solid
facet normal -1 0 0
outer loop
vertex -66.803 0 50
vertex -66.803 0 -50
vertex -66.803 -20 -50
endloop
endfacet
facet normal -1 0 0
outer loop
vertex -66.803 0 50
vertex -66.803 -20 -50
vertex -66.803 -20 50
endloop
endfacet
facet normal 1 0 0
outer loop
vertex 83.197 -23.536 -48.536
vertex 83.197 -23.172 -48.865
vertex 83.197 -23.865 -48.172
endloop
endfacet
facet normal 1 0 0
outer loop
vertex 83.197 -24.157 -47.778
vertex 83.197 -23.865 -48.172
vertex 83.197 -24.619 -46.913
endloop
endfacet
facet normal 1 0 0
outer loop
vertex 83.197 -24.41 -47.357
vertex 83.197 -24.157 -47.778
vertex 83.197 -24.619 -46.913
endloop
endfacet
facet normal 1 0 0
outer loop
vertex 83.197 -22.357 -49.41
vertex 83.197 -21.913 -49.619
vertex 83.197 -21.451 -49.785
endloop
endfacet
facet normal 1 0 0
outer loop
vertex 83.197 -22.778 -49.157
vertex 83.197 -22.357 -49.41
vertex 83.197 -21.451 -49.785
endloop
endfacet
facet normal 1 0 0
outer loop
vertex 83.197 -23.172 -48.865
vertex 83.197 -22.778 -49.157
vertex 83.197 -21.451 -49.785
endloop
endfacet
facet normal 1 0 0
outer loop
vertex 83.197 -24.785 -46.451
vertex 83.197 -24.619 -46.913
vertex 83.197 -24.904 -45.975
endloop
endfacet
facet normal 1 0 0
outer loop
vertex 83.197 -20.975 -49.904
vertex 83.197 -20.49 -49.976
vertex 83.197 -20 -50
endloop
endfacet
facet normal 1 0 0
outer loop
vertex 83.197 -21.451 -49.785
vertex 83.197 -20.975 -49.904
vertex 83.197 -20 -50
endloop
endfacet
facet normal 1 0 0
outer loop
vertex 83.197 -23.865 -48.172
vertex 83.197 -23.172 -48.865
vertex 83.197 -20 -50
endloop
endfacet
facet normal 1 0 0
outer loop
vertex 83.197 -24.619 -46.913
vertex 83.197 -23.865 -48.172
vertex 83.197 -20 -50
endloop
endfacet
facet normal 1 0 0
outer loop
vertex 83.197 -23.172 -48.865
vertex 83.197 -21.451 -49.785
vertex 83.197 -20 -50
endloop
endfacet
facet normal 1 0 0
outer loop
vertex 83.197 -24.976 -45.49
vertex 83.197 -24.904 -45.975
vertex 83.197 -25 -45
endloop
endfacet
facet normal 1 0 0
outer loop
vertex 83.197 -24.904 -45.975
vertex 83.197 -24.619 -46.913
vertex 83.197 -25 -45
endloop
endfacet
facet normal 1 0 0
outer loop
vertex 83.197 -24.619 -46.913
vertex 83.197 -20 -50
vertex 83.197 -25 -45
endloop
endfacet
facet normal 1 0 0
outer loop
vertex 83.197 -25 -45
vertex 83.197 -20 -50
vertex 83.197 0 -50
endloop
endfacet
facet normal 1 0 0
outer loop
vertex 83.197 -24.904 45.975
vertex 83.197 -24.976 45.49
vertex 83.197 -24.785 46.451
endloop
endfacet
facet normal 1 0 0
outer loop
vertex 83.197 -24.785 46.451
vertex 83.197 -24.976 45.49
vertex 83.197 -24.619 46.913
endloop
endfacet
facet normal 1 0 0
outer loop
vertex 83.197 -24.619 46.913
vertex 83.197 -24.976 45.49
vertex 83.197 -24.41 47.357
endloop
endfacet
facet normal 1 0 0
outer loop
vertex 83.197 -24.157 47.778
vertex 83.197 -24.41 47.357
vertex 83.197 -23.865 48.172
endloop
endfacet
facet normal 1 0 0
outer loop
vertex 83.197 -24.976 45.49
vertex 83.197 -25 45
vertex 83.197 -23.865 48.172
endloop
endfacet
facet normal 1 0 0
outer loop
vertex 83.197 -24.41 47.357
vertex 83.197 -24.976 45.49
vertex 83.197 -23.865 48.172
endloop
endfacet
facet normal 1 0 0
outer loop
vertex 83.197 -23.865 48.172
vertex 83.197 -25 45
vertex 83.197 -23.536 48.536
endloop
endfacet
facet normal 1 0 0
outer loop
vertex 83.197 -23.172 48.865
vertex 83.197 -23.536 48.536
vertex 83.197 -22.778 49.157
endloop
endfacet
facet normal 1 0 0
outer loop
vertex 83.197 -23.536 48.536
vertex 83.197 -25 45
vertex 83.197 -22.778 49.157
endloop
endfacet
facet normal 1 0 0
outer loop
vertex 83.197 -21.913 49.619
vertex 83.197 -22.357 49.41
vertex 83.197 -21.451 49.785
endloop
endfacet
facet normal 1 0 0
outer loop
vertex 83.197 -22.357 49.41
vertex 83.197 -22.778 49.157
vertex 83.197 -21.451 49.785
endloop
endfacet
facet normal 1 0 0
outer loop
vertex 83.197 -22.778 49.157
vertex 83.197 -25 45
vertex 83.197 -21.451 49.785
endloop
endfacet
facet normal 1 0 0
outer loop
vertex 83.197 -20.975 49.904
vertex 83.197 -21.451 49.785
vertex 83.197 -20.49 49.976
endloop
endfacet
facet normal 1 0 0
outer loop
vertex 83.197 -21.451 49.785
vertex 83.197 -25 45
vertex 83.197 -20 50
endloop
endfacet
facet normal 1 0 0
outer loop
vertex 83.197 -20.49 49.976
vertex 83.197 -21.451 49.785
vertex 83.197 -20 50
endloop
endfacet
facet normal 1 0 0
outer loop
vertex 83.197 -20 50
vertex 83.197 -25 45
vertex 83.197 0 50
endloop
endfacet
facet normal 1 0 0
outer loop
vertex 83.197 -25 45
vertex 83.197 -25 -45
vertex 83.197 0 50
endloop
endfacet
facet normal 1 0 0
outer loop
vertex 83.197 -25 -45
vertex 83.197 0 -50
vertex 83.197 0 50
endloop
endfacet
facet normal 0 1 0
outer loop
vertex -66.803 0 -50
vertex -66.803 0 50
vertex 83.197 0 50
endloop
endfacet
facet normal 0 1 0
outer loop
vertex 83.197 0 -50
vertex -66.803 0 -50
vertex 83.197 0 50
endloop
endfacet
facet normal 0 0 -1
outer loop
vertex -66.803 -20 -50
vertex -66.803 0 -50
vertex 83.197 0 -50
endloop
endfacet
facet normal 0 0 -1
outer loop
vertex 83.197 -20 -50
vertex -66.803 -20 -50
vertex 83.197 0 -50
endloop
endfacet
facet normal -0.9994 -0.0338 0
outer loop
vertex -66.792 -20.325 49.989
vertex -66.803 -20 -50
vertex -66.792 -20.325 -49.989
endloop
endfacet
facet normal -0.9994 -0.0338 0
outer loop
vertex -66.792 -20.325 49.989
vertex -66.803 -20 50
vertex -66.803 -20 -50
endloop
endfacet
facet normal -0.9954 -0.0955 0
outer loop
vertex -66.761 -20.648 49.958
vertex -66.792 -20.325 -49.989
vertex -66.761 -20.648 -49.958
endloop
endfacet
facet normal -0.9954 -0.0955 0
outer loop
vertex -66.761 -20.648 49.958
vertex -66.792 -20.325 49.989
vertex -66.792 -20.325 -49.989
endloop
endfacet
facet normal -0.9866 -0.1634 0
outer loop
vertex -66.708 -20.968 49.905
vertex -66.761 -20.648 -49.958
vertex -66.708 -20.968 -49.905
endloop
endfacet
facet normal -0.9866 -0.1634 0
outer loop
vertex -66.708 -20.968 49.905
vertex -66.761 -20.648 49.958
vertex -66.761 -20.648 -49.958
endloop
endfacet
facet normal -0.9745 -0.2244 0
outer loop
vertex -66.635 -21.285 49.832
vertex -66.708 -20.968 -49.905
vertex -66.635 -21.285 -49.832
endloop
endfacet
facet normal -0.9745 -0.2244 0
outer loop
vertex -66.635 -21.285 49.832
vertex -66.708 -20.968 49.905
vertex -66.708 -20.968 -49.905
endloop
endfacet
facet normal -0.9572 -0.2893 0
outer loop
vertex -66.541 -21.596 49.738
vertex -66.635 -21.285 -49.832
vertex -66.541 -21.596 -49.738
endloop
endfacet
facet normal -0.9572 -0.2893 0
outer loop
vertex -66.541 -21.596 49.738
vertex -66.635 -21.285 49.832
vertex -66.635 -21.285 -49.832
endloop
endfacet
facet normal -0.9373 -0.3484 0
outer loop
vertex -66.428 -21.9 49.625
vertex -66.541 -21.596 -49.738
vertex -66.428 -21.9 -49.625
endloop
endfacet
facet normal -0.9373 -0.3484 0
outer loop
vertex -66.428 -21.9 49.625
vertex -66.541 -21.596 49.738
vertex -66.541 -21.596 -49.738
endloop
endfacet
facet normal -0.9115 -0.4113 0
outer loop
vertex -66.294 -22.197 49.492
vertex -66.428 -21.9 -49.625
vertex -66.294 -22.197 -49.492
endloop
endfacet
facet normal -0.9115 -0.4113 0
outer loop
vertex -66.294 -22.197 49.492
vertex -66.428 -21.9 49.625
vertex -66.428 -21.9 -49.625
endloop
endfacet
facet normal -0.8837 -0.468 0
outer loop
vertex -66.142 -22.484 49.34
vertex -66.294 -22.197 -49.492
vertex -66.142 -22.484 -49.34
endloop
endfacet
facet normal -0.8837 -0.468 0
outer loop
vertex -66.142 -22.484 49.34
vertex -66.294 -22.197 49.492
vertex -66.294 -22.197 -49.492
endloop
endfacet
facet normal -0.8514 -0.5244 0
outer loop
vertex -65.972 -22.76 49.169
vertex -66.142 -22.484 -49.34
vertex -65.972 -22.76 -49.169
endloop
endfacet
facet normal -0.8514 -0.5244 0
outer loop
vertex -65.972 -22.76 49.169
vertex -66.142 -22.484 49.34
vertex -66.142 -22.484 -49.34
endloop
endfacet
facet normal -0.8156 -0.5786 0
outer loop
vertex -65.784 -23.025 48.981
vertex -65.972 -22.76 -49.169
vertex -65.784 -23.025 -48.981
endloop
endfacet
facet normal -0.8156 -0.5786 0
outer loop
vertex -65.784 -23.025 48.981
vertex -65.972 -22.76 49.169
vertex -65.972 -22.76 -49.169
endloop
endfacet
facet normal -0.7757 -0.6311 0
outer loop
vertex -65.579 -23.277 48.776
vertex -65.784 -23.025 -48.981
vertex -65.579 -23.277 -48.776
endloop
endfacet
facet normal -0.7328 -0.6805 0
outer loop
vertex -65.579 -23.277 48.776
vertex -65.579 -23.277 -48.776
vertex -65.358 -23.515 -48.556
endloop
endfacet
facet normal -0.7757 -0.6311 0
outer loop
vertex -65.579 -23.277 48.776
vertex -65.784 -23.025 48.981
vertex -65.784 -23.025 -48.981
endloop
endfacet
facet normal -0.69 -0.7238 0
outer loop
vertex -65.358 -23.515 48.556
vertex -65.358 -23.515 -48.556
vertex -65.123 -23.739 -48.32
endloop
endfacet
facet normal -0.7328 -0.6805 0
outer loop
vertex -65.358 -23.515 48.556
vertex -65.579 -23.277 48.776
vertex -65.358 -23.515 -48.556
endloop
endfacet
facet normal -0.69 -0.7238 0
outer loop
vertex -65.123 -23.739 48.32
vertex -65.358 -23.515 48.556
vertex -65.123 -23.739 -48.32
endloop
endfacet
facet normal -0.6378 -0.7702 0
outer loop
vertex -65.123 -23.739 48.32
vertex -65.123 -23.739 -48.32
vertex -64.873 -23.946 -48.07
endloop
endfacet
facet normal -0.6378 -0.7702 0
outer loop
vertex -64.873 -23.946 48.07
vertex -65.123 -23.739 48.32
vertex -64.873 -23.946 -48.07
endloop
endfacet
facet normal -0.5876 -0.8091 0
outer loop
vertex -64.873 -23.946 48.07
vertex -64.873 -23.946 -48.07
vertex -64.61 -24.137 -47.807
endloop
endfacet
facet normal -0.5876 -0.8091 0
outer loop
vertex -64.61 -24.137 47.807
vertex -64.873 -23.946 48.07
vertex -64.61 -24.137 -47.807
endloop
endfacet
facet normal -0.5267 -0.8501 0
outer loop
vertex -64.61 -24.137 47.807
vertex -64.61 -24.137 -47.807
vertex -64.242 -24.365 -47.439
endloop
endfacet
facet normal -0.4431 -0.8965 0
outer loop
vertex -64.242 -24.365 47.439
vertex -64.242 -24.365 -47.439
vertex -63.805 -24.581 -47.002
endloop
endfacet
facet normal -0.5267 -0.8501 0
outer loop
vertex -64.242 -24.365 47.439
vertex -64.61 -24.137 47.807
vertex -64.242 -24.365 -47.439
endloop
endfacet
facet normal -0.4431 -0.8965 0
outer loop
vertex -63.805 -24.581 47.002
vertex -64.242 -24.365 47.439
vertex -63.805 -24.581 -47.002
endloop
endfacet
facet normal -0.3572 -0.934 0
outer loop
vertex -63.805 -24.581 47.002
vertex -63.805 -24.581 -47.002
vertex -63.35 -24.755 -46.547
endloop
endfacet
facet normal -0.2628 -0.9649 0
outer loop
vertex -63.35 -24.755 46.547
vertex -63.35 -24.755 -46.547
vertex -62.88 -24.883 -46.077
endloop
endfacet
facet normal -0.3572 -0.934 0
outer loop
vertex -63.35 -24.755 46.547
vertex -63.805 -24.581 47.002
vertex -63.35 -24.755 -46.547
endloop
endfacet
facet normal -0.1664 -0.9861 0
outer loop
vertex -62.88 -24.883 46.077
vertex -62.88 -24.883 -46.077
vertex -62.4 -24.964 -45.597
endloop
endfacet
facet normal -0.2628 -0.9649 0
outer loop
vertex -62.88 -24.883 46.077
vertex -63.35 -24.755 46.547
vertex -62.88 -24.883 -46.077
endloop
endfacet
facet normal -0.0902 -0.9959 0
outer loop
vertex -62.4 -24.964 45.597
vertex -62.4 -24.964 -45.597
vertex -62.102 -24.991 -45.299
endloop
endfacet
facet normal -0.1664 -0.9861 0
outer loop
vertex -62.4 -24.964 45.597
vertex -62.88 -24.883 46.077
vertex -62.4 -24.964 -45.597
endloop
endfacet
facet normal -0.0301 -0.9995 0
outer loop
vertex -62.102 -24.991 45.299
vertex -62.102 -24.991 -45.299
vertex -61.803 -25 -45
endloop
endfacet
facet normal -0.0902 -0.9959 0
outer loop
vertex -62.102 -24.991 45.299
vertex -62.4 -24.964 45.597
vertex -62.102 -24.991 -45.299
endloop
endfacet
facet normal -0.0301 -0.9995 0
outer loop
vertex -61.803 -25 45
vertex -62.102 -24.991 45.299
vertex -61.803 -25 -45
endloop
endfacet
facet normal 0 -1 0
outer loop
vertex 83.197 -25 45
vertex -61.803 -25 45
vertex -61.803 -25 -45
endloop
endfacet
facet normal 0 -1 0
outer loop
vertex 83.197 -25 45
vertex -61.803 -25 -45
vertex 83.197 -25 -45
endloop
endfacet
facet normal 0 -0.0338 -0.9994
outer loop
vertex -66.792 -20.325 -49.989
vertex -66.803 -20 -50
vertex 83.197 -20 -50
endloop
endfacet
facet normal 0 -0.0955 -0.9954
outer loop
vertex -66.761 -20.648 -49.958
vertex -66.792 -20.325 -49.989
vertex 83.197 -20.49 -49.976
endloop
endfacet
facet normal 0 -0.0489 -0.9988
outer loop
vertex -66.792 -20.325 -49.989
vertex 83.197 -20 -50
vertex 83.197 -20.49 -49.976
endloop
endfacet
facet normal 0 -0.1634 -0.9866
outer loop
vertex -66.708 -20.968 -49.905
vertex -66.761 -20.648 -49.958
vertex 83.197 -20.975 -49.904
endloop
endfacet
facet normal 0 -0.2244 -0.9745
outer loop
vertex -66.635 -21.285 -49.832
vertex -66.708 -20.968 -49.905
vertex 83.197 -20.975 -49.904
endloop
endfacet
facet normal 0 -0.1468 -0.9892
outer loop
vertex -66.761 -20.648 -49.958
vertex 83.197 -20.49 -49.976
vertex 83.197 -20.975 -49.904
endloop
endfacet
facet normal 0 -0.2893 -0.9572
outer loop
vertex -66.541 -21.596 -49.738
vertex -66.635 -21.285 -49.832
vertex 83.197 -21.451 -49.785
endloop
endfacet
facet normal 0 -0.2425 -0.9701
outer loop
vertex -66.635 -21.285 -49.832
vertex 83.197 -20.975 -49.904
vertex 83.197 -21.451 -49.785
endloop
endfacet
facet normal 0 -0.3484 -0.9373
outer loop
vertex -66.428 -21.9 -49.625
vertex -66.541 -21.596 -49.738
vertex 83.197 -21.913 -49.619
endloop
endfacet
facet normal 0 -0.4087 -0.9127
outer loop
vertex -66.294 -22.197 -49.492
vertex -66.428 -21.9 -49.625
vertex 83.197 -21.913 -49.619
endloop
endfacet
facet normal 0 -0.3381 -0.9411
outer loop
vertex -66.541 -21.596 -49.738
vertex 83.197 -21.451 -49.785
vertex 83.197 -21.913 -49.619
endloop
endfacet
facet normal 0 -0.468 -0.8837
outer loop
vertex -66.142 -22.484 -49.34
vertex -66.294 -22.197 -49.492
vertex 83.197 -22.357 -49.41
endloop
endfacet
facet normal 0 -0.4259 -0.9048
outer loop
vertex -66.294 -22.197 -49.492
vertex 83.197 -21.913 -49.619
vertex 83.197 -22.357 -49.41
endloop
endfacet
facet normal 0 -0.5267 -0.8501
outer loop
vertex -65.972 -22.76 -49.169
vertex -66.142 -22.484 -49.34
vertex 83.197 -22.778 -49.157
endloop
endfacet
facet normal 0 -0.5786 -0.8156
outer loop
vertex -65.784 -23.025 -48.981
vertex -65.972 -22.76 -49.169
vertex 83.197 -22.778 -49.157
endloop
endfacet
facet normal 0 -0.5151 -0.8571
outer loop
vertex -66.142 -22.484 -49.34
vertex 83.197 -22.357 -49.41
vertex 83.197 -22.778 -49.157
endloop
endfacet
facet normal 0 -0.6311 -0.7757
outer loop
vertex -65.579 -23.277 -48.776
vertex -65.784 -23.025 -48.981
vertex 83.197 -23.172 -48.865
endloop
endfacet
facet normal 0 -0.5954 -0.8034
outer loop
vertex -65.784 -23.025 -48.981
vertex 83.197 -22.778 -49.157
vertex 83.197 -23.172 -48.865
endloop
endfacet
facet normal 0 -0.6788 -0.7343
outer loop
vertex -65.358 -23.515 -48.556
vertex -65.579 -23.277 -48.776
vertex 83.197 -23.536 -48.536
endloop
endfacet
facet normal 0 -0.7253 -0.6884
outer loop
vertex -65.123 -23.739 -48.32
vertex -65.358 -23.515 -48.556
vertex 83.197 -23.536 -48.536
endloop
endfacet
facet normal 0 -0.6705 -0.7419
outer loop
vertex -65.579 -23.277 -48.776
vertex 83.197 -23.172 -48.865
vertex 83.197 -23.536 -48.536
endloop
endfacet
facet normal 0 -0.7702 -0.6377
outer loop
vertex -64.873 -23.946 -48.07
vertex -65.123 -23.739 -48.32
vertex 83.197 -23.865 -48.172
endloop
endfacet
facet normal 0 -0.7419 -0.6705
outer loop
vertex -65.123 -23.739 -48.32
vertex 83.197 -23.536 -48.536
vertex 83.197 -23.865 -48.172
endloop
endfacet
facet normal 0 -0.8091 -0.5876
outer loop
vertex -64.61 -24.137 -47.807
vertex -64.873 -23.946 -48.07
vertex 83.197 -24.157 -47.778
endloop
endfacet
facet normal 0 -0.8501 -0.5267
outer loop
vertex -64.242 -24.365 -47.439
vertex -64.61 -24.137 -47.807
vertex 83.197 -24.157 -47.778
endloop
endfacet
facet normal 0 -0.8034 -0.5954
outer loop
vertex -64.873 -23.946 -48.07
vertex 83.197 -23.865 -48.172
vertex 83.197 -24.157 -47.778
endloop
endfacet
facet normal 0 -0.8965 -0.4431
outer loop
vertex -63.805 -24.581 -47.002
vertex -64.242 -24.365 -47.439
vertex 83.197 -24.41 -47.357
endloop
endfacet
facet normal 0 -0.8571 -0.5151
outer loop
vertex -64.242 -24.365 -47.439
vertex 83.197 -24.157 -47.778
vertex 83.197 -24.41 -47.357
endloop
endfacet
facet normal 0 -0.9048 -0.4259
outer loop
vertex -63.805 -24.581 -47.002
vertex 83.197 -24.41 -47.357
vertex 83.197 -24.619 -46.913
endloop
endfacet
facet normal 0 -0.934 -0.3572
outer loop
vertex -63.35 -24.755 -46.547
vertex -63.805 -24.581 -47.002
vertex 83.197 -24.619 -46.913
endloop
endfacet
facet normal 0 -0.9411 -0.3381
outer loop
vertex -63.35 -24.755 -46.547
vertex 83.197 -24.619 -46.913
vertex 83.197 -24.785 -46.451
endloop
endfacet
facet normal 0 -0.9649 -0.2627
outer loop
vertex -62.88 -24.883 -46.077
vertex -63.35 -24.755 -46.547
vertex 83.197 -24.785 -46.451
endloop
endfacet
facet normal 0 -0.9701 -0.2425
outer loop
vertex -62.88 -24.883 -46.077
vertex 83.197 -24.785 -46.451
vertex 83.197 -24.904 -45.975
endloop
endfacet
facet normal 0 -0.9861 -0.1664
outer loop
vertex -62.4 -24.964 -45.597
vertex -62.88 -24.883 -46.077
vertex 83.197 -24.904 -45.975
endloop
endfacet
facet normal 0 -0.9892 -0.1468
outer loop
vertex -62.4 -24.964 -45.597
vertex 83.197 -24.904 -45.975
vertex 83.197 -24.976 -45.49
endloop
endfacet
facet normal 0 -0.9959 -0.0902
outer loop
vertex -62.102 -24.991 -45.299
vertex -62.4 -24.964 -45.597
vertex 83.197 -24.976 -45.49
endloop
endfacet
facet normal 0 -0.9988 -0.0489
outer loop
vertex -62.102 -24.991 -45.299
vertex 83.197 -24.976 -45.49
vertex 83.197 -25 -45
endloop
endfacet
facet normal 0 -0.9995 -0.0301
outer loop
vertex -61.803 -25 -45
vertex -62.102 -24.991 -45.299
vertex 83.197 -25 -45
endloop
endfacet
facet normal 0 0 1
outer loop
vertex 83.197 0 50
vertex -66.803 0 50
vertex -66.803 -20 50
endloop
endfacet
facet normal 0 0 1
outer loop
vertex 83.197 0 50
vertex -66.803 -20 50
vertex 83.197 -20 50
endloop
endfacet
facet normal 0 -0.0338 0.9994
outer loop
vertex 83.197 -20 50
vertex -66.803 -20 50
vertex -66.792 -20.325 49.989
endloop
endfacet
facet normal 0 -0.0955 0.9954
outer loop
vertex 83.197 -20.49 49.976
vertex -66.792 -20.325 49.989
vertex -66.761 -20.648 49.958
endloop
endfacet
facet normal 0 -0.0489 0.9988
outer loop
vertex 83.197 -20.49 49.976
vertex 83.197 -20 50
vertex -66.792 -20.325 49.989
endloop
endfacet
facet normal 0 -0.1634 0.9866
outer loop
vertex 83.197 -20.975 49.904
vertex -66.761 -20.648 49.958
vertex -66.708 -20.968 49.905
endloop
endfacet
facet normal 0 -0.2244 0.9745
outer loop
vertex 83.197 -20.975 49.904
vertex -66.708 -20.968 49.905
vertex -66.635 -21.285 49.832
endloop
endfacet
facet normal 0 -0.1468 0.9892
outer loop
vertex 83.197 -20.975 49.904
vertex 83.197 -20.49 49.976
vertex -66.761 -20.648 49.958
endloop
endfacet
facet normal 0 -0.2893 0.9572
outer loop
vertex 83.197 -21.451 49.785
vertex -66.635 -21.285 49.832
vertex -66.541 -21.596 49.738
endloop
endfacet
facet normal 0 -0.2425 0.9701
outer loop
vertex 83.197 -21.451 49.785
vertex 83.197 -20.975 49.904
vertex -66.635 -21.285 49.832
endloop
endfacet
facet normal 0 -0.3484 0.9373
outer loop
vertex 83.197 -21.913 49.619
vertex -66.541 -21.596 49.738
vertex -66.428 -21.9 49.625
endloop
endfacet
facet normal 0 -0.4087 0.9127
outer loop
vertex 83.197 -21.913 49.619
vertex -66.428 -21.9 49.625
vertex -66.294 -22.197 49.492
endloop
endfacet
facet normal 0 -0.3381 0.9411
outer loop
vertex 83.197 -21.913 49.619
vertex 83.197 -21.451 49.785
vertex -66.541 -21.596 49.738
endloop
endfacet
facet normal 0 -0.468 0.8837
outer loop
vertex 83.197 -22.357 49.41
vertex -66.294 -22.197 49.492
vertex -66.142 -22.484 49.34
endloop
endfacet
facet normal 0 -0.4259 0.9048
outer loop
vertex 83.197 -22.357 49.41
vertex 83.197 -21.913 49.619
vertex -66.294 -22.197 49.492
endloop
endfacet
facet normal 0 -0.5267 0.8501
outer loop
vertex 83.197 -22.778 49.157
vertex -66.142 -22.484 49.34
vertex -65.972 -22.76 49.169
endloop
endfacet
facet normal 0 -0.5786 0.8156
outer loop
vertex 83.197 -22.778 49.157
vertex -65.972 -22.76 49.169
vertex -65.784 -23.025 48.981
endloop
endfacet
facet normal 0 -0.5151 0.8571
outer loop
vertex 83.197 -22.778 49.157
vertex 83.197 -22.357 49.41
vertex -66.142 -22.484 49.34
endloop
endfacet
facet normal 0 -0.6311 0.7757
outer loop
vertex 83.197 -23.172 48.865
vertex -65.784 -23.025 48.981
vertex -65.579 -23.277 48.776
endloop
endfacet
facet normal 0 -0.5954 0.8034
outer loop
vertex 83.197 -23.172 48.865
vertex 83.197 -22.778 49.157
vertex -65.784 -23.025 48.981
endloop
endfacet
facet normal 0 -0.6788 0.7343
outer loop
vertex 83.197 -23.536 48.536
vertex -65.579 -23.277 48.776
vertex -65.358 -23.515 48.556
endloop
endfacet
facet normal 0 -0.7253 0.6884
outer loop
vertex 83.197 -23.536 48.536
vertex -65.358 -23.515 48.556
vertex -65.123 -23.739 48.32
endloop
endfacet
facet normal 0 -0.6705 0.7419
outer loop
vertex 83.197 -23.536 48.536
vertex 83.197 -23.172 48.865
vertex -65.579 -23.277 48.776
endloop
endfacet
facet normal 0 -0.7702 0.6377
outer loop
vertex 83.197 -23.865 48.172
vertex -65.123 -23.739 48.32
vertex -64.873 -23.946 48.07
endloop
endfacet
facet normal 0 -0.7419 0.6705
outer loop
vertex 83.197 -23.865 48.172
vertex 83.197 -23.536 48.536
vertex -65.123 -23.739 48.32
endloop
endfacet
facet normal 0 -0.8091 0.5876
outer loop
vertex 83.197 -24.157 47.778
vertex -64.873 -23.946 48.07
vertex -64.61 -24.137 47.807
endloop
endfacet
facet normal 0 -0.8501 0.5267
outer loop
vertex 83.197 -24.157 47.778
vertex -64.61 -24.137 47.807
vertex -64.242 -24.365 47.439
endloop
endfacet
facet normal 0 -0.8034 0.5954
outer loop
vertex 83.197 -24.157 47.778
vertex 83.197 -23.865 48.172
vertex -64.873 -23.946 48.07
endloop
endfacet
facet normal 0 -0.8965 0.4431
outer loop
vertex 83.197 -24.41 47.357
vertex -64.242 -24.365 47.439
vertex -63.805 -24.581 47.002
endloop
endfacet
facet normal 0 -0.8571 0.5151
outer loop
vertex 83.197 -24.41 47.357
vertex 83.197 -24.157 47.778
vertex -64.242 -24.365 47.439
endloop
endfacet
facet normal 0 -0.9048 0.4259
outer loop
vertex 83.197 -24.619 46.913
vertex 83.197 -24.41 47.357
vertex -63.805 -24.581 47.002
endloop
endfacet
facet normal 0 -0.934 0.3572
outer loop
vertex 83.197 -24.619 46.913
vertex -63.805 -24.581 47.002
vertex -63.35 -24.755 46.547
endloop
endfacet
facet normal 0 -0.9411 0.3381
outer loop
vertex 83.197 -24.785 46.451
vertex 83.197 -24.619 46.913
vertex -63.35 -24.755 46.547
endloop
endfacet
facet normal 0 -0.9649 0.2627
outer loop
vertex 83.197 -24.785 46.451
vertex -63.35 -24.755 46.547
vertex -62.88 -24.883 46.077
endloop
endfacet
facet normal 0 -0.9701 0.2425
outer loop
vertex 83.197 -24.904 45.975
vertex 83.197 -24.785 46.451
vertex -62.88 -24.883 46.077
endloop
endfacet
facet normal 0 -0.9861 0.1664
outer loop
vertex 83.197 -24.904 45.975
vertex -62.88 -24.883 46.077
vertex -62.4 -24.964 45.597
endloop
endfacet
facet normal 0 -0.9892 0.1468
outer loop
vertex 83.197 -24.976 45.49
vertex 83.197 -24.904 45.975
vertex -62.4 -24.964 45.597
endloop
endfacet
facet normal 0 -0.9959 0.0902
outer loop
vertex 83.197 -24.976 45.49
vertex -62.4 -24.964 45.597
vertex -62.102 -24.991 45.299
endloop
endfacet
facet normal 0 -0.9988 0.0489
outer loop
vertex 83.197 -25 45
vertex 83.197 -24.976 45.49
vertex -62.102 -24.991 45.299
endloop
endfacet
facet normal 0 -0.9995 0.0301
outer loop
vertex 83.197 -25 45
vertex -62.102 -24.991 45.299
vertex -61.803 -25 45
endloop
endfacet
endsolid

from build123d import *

# Parameters (mm, degrees)
F0_W     = 150
F0_H     = 100
F1_DEPTH = 25
F2_R     = 5


# Not quite as in the source:
# - a feature names something its author has since deleted; it is built from what else it names


with BuildPart() as f1:
    # F0 (on Front) → F1 (new body)
    with BuildSketch(Plane.XZ):
        with Locations((8.1972908229, 0)):
            Rectangle(F0_W, F0_H)
    extrude(amount=F1_DEPTH)

    # F2
    f2_edges = [f1.edges().sort_by_distance(p)[0] for p in [
        (8.197291, -25, 50),
        (-66.802709, -25, 0),
        (8.197291, -25, -50),
    ]]
    fillet(f2_edges, radius=F2_R)


solid = f1.part
